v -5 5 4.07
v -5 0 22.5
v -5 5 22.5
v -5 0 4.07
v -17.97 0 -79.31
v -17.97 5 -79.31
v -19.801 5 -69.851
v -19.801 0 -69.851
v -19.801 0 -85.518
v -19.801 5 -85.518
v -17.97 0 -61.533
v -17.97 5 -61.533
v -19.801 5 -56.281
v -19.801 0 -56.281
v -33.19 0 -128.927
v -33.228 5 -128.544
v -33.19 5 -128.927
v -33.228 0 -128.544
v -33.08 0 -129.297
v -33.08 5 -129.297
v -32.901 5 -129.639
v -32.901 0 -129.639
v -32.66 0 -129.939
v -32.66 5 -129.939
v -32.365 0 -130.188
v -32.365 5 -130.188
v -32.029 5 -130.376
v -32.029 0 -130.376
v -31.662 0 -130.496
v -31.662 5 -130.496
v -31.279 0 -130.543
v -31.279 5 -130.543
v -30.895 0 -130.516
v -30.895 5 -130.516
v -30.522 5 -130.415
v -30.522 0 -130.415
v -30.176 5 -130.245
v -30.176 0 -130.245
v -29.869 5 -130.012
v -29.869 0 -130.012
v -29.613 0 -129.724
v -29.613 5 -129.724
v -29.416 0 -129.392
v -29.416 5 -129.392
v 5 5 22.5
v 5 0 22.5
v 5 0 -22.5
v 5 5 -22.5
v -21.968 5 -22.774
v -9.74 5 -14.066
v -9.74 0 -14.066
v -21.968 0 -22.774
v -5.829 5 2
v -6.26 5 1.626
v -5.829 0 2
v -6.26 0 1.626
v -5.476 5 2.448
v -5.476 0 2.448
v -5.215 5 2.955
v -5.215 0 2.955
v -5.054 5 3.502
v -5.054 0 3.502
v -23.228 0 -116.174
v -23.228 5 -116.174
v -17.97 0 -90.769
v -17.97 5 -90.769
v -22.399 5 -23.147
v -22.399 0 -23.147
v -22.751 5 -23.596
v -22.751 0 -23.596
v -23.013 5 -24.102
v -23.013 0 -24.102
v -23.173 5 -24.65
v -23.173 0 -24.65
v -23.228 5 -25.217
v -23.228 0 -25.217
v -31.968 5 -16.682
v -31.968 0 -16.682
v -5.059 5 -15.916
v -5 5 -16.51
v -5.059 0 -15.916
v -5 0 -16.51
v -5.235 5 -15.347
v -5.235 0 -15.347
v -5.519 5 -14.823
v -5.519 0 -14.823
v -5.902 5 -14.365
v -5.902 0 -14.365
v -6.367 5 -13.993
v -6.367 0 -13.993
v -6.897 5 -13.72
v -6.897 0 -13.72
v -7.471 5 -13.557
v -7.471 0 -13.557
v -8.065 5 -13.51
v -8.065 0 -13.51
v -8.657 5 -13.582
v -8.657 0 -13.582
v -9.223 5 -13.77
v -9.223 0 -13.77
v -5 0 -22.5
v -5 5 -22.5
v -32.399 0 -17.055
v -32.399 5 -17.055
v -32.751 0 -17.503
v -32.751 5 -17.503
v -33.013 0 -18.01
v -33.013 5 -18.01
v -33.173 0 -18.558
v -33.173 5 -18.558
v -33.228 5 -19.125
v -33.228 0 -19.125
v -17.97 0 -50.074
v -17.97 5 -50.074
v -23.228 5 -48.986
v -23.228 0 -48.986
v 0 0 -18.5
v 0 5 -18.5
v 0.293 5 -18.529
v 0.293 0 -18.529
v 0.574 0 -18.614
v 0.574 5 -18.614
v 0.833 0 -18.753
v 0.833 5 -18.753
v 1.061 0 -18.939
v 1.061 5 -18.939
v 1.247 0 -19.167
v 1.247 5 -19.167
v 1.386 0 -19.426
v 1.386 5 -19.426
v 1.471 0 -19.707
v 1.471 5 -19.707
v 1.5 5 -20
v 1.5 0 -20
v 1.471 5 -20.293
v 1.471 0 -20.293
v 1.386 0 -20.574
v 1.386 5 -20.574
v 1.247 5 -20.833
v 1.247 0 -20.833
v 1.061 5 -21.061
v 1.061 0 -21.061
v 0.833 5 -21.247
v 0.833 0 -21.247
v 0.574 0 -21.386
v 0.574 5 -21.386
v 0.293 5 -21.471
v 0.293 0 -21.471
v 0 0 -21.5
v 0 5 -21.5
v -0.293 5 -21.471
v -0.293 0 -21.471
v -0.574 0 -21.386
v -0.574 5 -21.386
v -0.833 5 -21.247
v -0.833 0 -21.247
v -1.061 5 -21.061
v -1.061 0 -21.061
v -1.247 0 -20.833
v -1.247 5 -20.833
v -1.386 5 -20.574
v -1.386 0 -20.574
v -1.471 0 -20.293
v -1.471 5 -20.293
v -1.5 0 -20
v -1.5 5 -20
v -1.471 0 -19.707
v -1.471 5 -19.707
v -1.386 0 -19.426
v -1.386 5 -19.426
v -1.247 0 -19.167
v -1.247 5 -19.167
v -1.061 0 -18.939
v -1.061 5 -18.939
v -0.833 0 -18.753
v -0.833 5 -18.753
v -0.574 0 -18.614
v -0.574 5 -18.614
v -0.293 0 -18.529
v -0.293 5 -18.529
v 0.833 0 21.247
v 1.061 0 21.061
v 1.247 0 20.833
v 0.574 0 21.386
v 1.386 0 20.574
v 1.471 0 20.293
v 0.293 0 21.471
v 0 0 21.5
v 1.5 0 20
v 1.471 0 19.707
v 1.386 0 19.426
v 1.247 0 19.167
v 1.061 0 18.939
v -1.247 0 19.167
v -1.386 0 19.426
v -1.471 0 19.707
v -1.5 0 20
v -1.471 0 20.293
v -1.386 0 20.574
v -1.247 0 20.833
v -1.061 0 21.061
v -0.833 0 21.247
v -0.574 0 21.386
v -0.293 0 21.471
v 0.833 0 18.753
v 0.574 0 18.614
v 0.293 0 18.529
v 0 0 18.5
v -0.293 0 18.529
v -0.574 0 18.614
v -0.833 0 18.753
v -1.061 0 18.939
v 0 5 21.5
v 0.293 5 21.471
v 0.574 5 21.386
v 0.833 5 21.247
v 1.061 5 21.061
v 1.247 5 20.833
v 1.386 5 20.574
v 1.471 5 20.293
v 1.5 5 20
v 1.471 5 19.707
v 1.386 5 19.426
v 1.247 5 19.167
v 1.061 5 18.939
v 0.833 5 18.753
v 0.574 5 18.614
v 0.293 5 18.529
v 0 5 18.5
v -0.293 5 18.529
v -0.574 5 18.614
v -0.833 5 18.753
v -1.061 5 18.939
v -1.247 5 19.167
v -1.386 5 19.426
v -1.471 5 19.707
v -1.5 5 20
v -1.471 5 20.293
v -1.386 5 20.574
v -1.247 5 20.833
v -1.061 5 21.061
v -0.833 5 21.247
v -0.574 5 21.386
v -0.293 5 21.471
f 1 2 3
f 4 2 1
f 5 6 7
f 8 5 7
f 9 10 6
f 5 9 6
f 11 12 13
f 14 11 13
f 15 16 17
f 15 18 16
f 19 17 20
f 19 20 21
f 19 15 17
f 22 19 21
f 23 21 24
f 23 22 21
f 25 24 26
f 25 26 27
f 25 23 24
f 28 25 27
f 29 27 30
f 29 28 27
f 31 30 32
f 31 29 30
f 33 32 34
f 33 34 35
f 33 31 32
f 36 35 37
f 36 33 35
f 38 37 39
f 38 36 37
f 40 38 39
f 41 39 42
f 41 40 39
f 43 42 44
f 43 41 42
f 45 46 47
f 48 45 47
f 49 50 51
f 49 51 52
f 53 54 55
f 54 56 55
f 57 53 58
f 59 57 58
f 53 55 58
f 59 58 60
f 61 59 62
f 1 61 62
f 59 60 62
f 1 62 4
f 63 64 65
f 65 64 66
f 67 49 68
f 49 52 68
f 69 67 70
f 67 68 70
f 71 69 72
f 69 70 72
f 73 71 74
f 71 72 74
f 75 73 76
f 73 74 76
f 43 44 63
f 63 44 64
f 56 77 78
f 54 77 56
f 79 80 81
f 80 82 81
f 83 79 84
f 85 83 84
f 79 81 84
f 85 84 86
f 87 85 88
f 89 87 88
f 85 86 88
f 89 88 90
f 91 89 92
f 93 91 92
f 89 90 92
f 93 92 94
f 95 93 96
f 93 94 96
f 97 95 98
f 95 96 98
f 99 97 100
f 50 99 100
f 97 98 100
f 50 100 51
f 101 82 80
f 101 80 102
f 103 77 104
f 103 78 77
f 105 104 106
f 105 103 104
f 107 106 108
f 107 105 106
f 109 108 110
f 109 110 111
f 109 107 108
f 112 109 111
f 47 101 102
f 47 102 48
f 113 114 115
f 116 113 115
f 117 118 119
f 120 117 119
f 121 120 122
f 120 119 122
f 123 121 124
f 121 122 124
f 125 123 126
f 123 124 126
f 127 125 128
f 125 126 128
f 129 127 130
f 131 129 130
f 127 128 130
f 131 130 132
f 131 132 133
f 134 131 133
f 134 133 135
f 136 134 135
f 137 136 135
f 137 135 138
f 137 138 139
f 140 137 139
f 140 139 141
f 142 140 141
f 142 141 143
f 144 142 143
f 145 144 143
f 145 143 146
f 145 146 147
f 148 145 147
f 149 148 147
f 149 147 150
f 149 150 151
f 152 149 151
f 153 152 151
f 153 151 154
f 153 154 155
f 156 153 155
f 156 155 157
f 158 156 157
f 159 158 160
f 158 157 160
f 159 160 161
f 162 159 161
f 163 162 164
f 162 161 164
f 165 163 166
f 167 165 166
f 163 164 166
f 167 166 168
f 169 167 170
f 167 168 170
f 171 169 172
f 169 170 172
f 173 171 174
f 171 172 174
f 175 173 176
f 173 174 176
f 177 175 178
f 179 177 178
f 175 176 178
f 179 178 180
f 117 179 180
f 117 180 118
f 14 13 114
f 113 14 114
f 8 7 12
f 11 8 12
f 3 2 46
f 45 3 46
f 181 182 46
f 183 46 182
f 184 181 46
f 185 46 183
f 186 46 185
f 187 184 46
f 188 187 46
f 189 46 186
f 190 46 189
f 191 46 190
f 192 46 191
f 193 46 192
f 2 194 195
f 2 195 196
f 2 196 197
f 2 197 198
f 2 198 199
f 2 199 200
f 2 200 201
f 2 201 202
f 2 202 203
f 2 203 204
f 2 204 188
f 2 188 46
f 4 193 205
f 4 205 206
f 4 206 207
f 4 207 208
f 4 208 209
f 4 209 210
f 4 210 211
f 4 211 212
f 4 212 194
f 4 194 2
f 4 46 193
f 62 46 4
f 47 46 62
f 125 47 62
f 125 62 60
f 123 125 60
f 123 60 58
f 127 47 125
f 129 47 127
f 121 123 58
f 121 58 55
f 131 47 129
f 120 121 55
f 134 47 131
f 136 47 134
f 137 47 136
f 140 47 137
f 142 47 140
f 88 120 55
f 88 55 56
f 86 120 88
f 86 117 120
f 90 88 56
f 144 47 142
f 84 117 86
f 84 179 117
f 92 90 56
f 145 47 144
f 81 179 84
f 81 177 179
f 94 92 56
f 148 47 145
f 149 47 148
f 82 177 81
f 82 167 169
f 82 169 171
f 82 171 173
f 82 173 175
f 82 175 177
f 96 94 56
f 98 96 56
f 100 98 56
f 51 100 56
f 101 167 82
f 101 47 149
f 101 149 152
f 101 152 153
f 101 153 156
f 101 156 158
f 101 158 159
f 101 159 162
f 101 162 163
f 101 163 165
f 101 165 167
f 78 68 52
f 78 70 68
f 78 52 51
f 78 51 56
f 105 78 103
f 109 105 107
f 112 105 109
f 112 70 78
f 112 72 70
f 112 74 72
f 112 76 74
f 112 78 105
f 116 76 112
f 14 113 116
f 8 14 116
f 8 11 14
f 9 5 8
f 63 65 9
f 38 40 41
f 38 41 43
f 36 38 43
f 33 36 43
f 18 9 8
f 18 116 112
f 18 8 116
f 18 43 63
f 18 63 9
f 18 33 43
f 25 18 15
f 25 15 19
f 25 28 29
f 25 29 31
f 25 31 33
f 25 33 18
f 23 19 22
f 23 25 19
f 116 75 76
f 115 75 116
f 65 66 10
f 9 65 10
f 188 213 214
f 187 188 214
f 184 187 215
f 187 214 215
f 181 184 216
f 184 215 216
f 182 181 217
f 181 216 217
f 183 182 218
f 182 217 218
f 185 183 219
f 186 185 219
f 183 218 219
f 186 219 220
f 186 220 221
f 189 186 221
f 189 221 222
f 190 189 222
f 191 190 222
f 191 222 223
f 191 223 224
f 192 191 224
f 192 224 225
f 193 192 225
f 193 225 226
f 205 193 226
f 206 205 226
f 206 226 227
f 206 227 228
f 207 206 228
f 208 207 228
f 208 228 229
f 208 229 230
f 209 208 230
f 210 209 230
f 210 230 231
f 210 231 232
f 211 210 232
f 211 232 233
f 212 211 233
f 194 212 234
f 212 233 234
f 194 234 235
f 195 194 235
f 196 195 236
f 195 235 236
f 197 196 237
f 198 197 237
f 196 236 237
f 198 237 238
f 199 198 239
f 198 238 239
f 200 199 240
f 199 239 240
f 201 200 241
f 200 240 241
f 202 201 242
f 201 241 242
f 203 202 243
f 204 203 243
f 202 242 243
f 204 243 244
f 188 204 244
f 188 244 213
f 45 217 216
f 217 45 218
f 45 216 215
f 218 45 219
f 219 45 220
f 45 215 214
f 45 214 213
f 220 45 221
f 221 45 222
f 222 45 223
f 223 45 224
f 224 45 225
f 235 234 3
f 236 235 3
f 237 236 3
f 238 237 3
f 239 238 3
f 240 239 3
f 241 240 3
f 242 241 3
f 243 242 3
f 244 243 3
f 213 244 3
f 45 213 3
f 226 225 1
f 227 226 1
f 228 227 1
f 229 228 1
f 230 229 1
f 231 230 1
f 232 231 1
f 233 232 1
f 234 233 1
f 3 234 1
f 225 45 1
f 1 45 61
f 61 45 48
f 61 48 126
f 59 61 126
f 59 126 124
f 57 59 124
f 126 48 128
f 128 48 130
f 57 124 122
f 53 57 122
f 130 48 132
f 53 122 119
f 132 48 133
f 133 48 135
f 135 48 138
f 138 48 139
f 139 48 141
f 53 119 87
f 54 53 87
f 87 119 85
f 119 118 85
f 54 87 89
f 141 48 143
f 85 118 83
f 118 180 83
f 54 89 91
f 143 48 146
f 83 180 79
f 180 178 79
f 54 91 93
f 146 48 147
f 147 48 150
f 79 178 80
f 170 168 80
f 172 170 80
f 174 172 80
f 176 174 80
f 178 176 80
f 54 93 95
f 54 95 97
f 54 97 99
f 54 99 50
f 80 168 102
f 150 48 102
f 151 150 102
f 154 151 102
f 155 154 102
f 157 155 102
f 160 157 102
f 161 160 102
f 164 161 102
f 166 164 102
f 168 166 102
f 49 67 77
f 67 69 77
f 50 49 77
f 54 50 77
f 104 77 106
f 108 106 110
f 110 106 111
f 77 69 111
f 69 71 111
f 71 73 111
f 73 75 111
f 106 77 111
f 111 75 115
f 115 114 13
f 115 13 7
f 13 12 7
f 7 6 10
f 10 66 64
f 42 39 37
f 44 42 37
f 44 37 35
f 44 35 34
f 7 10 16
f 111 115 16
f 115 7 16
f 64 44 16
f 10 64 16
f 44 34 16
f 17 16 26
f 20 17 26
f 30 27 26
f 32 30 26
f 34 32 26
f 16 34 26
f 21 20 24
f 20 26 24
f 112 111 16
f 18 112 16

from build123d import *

# Parameters (mm, degrees)
SKETCH1_W           = 10
SKETCH1_H           = 45
BOSS_EXTRUDE1_DEPTH = 5
SKETCH2_R           = 1.5
CUT_EXTRUDE1_DEPTH  = 8
BOSS_EXTRUDE3_DEPTH = 5
BOSS_EXTRUDE4_DEPTH = 5
FILLET1_R           = 2
FILLET2_R           = 3
FILLET3_R           = 3


with BuildPart() as part:
    # Sketch1 → Boss-Extrude1 (new body)
    with BuildSketch(Plane(origin=(0, 0, 0), x_dir=(1, 0, 0), z_dir=(0, 1, 0))):
        Rectangle(SKETCH1_W, SKETCH1_H)
    extrude(amount=BOSS_EXTRUDE1_DEPTH)

    # Sketch2 → Cut-Extrude1 (cut)
    with BuildSketch(Plane(origin=(0, 5, 0), x_dir=(1, 0, 0), z_dir=(0, 1, 0))):
        with Locations(Location((0, -20, 0), (0, 0, 270))):
            Circle(SKETCH2_R)
        with Locations(Location((0, 20, 0), (0, 0, 270))):
            Circle(SKETCH2_R)
    extrude(amount=-CUT_EXTRUDE1_DEPTH, mode=Mode.SUBTRACT)

    # Sketch6 → Boss-Extrude3 (add)
    with BuildSketch(Plane(origin=(0, 5, 0), x_dir=(1, 0, 0), z_dir=(0, 1, 0))):
        Polygon((-33.227631009, 17.578800472), (-5, -2.523297008), (-5, 10.69017833), (-23.227631009, 23.670850185), (-23.227631009, 104.538936329), (-33.227631009, 104.538936329), align=None)
    extrude(amount=-BOSS_EXTRUDE3_DEPTH)

    # Sketch7 → Boss-Extrude4 (add)
    with BuildSketch(Plane(origin=(0, 5, 0), x_dir=(1, 0, 0), z_dir=(0, 1, 0))):
        Polygon((-23.227631009, 116.174137028), (-17.970128301, 90.769004099), (-19.800511719, 85.517703367), (-17.970128301, 79.310161893), (-19.800511719, 69.850883837), (-17.970128301, 61.532596279), (-19.800511719, 56.281295548), (-17.970128301, 50.073754074), (-23.227631009, 48.98573242), (-23.227631009, 104.538936329), (-33.227631009, 104.538936329), (-33.227631009, 137.531613315), align=None)
    extrude(amount=-BOSS_EXTRUDE4_DEPTH)

    # Fillet1
    fillet1_edges = [part.edges().sort_by_distance(p)[0] for p in [
        (-33.227631009, 2.5, -137.531613315),
    ]]
    fillet(fillet1_edges, radius=FILLET1_R)

    # Fillet2
    fillet2_edges = [part.edges().sort_by_distance(p)[0] for p in [
        (-5, 2.5, 2.523297008),
        (-5, 2.5, -10.69017833),
        (-23.227631009, 2.5, -23.670850185),
    ]]
    fillet(fillet2_edges, radius=FILLET2_R)

    # Fillet3
    fillet3_edges = [part.edges().sort_by_distance(p)[0] for p in [
        (-33.227631009, 2.5, -17.578800472),
    ]]
    fillet(fillet3_edges, radius=FILLET3_R)


solid = part.part
